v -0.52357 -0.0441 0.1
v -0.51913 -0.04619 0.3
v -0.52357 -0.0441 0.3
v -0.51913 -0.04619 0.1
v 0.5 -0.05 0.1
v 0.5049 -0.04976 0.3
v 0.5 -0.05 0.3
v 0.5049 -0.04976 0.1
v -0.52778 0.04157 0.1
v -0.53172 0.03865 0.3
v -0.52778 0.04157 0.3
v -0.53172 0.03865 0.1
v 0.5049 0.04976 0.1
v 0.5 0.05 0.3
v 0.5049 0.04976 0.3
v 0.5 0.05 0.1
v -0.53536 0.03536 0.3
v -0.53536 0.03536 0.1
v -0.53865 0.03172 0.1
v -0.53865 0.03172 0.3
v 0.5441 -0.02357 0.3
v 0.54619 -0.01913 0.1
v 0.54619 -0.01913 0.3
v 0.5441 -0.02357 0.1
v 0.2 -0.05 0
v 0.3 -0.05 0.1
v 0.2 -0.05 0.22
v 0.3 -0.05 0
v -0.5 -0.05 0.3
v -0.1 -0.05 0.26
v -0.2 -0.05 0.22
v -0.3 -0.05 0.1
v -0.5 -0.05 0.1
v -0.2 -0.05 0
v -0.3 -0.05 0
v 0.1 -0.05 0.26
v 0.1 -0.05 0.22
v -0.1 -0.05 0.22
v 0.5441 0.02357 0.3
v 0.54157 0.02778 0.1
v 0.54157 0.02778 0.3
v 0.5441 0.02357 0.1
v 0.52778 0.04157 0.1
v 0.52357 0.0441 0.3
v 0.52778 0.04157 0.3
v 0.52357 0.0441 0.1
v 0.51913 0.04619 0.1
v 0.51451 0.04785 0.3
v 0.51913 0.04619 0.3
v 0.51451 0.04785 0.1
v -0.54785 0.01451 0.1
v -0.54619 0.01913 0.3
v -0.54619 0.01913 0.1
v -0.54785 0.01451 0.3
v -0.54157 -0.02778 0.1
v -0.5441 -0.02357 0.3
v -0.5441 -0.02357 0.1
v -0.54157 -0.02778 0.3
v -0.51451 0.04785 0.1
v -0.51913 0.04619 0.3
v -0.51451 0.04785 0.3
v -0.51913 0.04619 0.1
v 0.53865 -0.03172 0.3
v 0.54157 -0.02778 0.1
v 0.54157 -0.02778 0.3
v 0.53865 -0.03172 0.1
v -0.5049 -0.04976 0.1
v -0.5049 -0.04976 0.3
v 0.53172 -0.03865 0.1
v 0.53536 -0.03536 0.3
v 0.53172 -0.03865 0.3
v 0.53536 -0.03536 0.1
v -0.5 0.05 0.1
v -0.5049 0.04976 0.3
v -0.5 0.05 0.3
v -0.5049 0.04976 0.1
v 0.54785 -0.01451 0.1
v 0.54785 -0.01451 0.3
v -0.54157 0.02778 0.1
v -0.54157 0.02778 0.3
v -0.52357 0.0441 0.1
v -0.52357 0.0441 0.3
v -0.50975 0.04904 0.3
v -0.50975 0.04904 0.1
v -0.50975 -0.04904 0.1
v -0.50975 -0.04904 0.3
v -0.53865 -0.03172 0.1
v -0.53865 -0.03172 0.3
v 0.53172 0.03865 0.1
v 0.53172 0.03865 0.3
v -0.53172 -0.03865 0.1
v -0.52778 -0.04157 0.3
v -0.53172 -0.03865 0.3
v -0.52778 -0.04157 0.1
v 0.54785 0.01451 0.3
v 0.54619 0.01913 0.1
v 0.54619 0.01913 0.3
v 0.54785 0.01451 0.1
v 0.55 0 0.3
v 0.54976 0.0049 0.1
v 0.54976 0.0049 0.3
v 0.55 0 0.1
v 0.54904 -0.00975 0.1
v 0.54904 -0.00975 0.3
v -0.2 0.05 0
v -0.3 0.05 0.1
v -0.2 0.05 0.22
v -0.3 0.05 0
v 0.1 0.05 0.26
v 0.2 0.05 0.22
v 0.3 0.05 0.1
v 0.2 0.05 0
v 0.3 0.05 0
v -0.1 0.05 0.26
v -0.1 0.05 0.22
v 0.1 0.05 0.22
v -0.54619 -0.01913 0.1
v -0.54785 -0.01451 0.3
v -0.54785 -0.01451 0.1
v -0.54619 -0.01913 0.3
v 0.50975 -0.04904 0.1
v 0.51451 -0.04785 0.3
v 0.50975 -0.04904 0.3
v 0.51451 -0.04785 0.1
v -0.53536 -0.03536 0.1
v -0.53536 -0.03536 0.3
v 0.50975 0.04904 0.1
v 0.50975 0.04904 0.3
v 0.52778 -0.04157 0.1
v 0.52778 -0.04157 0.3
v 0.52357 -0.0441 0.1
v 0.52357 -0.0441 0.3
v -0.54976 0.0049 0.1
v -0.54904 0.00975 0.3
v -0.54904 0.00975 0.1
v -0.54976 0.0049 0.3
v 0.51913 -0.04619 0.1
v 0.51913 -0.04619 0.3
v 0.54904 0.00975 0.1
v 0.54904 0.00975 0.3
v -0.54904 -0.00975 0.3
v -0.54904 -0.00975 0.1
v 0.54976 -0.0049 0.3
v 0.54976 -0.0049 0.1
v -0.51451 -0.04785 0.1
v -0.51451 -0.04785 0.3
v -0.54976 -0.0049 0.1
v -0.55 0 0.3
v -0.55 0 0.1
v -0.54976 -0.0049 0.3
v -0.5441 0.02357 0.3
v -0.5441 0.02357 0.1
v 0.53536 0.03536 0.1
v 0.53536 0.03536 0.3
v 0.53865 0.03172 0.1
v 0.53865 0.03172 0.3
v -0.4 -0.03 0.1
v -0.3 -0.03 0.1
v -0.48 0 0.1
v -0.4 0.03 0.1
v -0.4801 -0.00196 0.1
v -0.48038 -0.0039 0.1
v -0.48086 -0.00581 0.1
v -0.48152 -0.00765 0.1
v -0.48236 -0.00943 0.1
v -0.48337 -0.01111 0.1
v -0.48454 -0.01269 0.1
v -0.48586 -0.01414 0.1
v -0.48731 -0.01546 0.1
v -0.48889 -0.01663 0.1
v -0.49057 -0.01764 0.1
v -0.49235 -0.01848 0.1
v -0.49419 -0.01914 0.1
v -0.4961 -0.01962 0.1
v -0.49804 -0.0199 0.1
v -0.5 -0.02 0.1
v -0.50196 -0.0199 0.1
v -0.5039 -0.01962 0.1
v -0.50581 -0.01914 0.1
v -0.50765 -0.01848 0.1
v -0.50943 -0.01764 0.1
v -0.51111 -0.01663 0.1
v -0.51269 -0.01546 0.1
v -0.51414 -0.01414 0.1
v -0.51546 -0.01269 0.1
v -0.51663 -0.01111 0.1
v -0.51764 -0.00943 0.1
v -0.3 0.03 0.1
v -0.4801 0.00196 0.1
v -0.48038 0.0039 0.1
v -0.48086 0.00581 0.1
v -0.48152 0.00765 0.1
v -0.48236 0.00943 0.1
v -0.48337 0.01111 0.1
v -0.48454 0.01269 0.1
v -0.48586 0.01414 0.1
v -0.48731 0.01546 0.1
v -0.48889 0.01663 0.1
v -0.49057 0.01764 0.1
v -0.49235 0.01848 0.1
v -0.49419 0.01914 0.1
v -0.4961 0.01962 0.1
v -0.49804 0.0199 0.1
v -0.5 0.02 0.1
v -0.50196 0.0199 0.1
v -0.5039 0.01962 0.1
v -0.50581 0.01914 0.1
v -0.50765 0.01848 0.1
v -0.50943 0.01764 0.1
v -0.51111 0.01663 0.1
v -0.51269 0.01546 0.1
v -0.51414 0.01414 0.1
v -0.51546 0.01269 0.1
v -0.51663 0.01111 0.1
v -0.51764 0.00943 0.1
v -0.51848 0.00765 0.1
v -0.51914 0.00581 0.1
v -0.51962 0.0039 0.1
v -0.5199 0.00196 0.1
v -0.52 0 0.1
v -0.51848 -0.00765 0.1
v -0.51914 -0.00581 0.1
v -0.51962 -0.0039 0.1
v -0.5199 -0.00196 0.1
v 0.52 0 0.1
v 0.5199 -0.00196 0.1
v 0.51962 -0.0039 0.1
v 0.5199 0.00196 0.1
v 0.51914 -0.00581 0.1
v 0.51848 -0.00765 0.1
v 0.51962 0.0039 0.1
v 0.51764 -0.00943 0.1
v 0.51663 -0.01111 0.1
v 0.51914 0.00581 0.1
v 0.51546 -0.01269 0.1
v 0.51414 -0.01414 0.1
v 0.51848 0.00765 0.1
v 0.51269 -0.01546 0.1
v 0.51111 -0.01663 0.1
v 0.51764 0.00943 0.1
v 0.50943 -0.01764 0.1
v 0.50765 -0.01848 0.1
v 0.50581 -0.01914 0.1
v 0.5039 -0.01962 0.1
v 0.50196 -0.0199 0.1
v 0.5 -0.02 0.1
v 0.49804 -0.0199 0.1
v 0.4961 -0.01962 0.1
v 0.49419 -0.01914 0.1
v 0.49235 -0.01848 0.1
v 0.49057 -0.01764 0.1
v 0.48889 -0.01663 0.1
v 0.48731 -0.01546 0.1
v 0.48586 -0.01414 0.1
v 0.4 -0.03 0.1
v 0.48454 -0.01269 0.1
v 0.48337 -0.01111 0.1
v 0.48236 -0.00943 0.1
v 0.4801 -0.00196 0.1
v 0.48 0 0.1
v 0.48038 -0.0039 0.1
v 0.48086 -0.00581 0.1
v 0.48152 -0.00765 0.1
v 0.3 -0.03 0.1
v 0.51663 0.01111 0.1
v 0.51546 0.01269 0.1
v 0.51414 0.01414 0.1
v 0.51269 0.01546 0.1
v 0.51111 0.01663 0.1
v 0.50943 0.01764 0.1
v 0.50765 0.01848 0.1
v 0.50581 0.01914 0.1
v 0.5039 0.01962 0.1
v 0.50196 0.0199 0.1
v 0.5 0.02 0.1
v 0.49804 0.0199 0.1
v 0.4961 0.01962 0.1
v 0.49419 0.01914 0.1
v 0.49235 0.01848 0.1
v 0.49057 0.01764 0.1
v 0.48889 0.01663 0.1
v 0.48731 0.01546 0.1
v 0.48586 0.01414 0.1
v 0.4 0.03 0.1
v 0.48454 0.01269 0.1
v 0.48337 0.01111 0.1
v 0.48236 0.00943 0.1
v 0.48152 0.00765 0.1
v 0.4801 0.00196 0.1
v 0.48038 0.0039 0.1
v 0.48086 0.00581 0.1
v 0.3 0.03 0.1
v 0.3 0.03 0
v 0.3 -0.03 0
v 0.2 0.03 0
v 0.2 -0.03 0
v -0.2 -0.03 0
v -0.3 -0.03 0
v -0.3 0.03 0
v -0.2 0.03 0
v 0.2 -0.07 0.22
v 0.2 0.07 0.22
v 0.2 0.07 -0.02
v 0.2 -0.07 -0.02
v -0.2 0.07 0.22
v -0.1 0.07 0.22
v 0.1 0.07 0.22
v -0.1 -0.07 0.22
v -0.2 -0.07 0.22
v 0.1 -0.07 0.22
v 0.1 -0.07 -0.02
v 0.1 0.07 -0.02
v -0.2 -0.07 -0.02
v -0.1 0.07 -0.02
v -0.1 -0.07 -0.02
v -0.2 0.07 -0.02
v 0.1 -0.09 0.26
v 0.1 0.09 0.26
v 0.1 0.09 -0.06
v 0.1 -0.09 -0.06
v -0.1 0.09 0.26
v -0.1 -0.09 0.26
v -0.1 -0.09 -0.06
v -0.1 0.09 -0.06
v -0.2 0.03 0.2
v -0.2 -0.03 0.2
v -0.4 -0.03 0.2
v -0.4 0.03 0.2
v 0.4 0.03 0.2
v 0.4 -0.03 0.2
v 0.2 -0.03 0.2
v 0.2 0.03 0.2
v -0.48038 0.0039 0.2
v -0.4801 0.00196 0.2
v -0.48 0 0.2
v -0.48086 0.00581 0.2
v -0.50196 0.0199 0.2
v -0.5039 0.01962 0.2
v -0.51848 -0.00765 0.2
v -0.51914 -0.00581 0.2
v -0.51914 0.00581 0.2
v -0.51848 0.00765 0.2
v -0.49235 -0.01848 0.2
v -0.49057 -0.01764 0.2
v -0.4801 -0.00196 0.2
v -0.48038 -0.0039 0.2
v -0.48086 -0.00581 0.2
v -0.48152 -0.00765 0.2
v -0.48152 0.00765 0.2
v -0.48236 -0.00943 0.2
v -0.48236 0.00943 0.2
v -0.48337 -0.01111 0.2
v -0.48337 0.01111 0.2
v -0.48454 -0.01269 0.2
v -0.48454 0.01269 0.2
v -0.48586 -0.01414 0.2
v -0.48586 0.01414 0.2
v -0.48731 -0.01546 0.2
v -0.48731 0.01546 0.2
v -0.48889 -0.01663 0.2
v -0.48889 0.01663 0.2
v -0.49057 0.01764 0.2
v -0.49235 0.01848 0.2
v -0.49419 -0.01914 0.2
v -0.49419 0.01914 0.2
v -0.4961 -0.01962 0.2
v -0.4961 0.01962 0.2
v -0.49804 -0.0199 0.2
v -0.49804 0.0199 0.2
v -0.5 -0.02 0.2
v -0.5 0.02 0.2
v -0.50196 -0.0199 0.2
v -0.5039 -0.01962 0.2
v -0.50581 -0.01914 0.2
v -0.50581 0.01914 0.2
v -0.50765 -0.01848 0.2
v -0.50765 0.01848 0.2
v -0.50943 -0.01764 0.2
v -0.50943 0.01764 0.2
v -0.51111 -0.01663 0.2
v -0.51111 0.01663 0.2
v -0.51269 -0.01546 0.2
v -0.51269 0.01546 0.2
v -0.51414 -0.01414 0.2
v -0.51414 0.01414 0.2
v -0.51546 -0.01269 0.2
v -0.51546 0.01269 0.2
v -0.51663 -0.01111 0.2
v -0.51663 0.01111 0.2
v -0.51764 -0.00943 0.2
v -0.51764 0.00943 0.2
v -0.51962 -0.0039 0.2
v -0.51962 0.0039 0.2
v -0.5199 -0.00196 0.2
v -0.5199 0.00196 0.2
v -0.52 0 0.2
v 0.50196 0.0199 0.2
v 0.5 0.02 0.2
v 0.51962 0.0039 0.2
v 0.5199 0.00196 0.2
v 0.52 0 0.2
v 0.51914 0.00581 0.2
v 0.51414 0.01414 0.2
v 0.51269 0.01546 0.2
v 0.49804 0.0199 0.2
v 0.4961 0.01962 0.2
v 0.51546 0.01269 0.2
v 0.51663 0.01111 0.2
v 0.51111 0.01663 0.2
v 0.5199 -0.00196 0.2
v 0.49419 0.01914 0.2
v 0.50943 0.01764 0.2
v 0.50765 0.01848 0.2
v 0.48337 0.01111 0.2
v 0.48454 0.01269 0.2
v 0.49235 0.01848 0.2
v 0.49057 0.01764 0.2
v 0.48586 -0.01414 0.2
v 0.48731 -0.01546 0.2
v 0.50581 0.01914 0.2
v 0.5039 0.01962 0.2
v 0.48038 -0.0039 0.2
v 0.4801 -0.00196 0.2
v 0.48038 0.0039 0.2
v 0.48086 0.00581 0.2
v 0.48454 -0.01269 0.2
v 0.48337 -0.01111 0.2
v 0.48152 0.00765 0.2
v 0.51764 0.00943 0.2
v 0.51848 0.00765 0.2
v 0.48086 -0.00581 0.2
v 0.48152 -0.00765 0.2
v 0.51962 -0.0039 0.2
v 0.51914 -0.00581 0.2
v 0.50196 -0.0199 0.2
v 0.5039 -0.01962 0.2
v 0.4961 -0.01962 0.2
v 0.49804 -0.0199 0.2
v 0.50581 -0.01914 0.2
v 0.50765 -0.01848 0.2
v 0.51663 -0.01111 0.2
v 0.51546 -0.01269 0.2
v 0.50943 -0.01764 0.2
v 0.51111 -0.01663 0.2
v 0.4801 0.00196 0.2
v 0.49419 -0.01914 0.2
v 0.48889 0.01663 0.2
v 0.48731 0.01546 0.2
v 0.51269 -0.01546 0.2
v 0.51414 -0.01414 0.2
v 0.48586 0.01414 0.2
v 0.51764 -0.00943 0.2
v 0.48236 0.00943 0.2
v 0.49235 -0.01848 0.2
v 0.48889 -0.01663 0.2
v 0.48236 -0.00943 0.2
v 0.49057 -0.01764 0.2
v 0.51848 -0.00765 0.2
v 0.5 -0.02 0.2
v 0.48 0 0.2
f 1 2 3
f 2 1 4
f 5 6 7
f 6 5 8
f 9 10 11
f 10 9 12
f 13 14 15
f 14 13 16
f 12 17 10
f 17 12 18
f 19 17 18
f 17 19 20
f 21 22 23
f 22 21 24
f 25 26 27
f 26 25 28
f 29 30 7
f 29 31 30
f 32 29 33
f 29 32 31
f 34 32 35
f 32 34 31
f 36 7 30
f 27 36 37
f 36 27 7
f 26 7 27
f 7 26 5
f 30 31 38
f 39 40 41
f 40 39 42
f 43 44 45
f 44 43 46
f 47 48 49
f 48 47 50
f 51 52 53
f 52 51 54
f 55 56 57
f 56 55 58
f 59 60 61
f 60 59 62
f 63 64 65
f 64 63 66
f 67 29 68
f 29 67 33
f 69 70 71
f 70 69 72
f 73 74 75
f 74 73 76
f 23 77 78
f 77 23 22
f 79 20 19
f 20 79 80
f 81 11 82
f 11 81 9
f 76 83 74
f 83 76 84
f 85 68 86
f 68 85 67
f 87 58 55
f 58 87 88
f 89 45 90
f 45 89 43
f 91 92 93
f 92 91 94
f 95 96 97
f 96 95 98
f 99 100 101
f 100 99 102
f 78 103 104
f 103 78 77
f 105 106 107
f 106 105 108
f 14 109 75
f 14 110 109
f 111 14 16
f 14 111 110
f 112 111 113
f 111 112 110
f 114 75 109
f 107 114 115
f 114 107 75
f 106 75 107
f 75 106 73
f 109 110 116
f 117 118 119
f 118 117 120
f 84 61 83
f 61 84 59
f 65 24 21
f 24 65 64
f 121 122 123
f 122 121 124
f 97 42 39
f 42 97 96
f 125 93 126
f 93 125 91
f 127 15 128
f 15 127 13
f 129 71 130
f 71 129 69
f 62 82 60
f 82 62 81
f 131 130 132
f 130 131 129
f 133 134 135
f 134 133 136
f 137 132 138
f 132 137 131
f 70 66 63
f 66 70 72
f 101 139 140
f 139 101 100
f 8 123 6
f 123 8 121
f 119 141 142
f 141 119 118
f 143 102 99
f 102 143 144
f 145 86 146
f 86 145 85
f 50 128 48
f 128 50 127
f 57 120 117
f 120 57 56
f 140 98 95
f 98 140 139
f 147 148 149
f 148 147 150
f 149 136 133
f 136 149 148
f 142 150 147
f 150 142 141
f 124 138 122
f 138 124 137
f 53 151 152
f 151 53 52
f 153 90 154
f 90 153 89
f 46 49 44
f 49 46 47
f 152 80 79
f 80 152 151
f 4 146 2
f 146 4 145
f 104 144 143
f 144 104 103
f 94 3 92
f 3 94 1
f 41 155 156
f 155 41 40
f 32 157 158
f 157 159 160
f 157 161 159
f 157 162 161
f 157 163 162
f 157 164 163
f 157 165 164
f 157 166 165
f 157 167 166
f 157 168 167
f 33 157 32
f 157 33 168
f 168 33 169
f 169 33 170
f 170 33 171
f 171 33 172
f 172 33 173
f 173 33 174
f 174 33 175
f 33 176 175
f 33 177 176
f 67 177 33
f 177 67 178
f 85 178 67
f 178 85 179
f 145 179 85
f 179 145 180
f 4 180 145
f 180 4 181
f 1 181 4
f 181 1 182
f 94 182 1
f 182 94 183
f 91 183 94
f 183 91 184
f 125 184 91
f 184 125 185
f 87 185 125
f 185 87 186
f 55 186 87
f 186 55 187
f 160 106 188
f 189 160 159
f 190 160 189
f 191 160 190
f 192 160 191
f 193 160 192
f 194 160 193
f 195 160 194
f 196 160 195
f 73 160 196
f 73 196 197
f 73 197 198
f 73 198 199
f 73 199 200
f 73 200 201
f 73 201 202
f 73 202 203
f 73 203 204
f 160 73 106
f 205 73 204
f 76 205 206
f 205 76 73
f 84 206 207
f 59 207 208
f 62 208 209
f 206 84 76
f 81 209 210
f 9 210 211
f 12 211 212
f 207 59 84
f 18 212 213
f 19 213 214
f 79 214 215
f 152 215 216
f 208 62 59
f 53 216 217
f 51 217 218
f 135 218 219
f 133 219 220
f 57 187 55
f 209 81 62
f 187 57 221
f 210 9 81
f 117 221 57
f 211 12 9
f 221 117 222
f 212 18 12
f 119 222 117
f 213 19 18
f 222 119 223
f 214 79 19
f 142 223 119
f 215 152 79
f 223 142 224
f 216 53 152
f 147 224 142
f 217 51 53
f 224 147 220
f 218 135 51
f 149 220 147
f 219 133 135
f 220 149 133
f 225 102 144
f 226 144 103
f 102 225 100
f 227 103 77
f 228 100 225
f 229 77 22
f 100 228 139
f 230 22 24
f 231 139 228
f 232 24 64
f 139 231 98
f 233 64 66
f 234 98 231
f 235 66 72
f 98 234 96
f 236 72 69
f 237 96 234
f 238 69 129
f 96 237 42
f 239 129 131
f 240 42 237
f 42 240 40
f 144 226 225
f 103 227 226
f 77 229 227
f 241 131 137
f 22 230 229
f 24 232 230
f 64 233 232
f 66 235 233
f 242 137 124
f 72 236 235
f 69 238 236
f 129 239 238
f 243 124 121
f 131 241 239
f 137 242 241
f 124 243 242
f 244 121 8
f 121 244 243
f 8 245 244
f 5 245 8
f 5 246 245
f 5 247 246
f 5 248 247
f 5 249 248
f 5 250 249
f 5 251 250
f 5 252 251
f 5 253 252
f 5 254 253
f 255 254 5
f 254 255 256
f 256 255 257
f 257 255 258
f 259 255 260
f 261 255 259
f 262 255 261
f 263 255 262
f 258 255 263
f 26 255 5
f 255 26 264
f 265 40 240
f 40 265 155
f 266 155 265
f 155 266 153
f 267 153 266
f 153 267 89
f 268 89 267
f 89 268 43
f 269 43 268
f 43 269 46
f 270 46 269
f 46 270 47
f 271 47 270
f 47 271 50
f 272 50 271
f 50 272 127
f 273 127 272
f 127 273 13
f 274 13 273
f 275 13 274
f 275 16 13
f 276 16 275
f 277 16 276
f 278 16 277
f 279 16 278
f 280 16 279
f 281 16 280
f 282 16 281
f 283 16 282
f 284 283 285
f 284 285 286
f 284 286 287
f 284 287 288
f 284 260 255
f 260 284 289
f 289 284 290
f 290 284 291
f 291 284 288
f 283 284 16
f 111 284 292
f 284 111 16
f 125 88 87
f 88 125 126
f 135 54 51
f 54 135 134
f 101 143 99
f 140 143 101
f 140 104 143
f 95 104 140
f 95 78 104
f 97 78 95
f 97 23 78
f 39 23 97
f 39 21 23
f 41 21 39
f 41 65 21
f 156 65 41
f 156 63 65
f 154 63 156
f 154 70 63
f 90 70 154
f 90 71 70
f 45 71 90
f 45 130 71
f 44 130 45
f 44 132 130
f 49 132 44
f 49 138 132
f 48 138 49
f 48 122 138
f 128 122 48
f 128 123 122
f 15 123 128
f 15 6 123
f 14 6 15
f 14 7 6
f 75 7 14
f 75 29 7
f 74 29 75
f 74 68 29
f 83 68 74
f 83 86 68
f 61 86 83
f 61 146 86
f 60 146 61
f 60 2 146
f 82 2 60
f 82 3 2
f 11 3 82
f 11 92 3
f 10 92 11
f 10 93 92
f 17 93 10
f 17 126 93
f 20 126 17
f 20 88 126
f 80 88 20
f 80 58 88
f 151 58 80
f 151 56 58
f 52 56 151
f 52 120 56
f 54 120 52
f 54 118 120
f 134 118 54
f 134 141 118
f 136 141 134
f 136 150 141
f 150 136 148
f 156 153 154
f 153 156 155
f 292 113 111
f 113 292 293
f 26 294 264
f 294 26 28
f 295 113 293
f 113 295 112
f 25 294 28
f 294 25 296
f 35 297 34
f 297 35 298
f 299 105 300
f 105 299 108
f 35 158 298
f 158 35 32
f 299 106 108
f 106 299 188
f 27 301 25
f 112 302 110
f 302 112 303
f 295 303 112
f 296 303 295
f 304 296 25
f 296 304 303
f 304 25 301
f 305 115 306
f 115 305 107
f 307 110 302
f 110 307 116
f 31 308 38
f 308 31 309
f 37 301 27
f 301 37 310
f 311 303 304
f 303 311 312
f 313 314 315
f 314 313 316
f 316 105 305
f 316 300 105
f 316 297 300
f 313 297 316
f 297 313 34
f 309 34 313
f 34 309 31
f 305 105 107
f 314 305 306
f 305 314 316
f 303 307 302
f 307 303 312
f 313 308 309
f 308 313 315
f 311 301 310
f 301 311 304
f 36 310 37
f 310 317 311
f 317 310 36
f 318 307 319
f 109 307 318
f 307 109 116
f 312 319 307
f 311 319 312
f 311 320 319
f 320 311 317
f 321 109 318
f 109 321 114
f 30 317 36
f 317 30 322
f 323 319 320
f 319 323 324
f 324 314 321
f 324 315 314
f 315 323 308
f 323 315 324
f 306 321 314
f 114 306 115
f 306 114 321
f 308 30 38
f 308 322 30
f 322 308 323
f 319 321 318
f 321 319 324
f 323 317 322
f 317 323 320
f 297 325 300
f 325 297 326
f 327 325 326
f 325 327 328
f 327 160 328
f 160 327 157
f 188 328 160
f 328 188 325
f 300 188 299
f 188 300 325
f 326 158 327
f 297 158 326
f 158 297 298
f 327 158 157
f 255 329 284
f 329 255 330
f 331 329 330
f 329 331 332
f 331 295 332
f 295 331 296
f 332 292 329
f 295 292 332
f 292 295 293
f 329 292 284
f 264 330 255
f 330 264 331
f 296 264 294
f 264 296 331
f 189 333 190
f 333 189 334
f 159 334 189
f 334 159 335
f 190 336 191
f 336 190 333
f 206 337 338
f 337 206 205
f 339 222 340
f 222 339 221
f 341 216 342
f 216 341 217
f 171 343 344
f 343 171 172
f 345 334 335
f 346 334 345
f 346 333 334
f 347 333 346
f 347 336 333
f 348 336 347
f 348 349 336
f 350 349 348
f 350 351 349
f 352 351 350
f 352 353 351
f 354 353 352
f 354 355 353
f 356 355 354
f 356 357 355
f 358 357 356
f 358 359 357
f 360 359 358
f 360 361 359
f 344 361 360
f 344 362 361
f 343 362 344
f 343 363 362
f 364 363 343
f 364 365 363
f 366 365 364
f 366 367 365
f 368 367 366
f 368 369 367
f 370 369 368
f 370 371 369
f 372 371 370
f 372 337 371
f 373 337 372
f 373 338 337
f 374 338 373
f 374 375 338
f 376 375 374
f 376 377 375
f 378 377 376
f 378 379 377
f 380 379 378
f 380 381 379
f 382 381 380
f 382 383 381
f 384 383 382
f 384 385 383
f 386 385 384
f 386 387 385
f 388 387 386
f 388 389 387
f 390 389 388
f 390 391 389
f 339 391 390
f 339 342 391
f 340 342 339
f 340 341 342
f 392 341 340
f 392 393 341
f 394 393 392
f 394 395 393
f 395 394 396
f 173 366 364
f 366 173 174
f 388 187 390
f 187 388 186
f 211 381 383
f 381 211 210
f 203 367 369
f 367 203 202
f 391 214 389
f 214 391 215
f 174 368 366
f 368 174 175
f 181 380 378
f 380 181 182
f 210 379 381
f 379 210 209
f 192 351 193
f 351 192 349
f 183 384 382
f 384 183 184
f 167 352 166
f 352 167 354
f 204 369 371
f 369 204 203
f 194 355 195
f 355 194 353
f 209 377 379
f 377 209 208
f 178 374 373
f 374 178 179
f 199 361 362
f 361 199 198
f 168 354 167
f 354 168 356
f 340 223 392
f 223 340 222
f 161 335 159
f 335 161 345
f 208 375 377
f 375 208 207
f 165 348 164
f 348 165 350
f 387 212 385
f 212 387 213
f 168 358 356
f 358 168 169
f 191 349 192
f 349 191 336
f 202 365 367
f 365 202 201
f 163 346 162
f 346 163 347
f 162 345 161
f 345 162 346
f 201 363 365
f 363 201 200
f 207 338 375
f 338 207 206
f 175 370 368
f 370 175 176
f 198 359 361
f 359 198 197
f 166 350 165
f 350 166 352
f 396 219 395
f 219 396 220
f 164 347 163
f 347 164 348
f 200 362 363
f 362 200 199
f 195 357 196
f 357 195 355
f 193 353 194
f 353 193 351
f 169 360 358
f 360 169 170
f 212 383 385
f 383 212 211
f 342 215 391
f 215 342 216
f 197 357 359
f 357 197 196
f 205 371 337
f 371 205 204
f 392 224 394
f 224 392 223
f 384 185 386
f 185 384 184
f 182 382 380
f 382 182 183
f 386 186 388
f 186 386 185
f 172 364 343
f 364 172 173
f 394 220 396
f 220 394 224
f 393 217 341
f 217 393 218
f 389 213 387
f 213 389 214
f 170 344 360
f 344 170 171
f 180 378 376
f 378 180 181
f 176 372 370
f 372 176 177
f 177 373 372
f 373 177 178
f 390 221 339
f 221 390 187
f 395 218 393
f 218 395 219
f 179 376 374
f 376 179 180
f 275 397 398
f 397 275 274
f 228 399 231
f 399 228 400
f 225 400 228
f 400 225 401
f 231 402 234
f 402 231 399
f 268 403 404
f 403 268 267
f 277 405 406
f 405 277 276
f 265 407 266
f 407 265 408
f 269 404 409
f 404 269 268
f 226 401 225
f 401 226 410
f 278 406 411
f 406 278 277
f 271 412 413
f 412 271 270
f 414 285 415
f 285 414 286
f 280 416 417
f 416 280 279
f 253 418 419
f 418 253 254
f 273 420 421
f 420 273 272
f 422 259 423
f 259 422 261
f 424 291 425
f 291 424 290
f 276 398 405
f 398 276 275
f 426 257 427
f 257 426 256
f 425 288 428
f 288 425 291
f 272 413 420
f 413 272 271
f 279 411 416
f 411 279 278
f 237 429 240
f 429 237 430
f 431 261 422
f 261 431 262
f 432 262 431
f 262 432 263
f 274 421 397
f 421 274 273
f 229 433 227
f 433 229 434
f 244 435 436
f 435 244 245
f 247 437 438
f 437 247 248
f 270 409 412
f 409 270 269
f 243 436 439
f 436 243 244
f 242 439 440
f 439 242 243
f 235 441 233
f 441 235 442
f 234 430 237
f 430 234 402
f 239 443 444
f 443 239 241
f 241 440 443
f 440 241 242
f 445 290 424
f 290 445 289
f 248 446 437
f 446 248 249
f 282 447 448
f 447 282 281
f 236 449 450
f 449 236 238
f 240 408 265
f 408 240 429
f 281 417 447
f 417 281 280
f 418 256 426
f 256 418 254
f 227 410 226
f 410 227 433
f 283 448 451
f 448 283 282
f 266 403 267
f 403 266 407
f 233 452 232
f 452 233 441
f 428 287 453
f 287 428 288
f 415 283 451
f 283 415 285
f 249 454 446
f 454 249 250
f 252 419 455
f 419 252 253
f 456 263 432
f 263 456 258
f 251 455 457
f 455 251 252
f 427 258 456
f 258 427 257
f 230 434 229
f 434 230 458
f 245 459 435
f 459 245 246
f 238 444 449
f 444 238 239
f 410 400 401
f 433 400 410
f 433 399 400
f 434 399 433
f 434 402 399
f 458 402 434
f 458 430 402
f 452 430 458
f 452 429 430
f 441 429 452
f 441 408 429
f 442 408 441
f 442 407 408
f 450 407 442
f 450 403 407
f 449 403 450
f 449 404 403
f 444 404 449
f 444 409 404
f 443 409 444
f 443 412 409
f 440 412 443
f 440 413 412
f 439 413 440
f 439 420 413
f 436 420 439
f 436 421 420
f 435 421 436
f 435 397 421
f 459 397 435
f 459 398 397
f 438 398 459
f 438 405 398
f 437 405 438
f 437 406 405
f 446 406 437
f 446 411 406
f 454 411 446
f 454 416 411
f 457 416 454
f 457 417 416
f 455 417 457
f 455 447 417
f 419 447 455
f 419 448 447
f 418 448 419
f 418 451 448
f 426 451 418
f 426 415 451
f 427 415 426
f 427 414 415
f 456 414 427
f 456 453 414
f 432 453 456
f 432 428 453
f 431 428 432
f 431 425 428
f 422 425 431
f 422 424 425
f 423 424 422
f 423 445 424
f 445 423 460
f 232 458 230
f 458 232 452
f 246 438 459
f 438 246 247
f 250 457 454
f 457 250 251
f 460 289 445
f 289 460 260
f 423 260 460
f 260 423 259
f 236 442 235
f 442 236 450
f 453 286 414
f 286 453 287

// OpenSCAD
$fn=64;

module bracket() {
    difference() {
        union() {
            // Main body with rounded ends
            hull() {
                translate([-50, 0, 0]) cylinder(h=5, r=5);
                translate([50, 0, 0]) cylinder(h=5, r=5);
            }
            // Central thickened body
            translate([-30, -5, -2.5]) cube([60, 10, 5]);
            // Stepped, faceted surfaces
            translate([-20, -7, -3]) cube([40, 14, 6]);
            translate([-10, -9, -4]) cube([20, 18, 8]);
        }
        // Rectangular through-windows
        translate([-40, -3, -2.5]) cube([20, 6, 5]);
        translate([20, -3, -2.5]) cube([20, 6, 5]);
        // Circular through-holes at ends
        translate([-50, 0, -2.5]) cylinder(h=5, r=2);
        translate([50, 0, -2.5]) cylinder(h=5, r=2);
    }
}

translate([0, 0, 0.1])
scale([0.01, 0.01, 0.04])
bracket();
